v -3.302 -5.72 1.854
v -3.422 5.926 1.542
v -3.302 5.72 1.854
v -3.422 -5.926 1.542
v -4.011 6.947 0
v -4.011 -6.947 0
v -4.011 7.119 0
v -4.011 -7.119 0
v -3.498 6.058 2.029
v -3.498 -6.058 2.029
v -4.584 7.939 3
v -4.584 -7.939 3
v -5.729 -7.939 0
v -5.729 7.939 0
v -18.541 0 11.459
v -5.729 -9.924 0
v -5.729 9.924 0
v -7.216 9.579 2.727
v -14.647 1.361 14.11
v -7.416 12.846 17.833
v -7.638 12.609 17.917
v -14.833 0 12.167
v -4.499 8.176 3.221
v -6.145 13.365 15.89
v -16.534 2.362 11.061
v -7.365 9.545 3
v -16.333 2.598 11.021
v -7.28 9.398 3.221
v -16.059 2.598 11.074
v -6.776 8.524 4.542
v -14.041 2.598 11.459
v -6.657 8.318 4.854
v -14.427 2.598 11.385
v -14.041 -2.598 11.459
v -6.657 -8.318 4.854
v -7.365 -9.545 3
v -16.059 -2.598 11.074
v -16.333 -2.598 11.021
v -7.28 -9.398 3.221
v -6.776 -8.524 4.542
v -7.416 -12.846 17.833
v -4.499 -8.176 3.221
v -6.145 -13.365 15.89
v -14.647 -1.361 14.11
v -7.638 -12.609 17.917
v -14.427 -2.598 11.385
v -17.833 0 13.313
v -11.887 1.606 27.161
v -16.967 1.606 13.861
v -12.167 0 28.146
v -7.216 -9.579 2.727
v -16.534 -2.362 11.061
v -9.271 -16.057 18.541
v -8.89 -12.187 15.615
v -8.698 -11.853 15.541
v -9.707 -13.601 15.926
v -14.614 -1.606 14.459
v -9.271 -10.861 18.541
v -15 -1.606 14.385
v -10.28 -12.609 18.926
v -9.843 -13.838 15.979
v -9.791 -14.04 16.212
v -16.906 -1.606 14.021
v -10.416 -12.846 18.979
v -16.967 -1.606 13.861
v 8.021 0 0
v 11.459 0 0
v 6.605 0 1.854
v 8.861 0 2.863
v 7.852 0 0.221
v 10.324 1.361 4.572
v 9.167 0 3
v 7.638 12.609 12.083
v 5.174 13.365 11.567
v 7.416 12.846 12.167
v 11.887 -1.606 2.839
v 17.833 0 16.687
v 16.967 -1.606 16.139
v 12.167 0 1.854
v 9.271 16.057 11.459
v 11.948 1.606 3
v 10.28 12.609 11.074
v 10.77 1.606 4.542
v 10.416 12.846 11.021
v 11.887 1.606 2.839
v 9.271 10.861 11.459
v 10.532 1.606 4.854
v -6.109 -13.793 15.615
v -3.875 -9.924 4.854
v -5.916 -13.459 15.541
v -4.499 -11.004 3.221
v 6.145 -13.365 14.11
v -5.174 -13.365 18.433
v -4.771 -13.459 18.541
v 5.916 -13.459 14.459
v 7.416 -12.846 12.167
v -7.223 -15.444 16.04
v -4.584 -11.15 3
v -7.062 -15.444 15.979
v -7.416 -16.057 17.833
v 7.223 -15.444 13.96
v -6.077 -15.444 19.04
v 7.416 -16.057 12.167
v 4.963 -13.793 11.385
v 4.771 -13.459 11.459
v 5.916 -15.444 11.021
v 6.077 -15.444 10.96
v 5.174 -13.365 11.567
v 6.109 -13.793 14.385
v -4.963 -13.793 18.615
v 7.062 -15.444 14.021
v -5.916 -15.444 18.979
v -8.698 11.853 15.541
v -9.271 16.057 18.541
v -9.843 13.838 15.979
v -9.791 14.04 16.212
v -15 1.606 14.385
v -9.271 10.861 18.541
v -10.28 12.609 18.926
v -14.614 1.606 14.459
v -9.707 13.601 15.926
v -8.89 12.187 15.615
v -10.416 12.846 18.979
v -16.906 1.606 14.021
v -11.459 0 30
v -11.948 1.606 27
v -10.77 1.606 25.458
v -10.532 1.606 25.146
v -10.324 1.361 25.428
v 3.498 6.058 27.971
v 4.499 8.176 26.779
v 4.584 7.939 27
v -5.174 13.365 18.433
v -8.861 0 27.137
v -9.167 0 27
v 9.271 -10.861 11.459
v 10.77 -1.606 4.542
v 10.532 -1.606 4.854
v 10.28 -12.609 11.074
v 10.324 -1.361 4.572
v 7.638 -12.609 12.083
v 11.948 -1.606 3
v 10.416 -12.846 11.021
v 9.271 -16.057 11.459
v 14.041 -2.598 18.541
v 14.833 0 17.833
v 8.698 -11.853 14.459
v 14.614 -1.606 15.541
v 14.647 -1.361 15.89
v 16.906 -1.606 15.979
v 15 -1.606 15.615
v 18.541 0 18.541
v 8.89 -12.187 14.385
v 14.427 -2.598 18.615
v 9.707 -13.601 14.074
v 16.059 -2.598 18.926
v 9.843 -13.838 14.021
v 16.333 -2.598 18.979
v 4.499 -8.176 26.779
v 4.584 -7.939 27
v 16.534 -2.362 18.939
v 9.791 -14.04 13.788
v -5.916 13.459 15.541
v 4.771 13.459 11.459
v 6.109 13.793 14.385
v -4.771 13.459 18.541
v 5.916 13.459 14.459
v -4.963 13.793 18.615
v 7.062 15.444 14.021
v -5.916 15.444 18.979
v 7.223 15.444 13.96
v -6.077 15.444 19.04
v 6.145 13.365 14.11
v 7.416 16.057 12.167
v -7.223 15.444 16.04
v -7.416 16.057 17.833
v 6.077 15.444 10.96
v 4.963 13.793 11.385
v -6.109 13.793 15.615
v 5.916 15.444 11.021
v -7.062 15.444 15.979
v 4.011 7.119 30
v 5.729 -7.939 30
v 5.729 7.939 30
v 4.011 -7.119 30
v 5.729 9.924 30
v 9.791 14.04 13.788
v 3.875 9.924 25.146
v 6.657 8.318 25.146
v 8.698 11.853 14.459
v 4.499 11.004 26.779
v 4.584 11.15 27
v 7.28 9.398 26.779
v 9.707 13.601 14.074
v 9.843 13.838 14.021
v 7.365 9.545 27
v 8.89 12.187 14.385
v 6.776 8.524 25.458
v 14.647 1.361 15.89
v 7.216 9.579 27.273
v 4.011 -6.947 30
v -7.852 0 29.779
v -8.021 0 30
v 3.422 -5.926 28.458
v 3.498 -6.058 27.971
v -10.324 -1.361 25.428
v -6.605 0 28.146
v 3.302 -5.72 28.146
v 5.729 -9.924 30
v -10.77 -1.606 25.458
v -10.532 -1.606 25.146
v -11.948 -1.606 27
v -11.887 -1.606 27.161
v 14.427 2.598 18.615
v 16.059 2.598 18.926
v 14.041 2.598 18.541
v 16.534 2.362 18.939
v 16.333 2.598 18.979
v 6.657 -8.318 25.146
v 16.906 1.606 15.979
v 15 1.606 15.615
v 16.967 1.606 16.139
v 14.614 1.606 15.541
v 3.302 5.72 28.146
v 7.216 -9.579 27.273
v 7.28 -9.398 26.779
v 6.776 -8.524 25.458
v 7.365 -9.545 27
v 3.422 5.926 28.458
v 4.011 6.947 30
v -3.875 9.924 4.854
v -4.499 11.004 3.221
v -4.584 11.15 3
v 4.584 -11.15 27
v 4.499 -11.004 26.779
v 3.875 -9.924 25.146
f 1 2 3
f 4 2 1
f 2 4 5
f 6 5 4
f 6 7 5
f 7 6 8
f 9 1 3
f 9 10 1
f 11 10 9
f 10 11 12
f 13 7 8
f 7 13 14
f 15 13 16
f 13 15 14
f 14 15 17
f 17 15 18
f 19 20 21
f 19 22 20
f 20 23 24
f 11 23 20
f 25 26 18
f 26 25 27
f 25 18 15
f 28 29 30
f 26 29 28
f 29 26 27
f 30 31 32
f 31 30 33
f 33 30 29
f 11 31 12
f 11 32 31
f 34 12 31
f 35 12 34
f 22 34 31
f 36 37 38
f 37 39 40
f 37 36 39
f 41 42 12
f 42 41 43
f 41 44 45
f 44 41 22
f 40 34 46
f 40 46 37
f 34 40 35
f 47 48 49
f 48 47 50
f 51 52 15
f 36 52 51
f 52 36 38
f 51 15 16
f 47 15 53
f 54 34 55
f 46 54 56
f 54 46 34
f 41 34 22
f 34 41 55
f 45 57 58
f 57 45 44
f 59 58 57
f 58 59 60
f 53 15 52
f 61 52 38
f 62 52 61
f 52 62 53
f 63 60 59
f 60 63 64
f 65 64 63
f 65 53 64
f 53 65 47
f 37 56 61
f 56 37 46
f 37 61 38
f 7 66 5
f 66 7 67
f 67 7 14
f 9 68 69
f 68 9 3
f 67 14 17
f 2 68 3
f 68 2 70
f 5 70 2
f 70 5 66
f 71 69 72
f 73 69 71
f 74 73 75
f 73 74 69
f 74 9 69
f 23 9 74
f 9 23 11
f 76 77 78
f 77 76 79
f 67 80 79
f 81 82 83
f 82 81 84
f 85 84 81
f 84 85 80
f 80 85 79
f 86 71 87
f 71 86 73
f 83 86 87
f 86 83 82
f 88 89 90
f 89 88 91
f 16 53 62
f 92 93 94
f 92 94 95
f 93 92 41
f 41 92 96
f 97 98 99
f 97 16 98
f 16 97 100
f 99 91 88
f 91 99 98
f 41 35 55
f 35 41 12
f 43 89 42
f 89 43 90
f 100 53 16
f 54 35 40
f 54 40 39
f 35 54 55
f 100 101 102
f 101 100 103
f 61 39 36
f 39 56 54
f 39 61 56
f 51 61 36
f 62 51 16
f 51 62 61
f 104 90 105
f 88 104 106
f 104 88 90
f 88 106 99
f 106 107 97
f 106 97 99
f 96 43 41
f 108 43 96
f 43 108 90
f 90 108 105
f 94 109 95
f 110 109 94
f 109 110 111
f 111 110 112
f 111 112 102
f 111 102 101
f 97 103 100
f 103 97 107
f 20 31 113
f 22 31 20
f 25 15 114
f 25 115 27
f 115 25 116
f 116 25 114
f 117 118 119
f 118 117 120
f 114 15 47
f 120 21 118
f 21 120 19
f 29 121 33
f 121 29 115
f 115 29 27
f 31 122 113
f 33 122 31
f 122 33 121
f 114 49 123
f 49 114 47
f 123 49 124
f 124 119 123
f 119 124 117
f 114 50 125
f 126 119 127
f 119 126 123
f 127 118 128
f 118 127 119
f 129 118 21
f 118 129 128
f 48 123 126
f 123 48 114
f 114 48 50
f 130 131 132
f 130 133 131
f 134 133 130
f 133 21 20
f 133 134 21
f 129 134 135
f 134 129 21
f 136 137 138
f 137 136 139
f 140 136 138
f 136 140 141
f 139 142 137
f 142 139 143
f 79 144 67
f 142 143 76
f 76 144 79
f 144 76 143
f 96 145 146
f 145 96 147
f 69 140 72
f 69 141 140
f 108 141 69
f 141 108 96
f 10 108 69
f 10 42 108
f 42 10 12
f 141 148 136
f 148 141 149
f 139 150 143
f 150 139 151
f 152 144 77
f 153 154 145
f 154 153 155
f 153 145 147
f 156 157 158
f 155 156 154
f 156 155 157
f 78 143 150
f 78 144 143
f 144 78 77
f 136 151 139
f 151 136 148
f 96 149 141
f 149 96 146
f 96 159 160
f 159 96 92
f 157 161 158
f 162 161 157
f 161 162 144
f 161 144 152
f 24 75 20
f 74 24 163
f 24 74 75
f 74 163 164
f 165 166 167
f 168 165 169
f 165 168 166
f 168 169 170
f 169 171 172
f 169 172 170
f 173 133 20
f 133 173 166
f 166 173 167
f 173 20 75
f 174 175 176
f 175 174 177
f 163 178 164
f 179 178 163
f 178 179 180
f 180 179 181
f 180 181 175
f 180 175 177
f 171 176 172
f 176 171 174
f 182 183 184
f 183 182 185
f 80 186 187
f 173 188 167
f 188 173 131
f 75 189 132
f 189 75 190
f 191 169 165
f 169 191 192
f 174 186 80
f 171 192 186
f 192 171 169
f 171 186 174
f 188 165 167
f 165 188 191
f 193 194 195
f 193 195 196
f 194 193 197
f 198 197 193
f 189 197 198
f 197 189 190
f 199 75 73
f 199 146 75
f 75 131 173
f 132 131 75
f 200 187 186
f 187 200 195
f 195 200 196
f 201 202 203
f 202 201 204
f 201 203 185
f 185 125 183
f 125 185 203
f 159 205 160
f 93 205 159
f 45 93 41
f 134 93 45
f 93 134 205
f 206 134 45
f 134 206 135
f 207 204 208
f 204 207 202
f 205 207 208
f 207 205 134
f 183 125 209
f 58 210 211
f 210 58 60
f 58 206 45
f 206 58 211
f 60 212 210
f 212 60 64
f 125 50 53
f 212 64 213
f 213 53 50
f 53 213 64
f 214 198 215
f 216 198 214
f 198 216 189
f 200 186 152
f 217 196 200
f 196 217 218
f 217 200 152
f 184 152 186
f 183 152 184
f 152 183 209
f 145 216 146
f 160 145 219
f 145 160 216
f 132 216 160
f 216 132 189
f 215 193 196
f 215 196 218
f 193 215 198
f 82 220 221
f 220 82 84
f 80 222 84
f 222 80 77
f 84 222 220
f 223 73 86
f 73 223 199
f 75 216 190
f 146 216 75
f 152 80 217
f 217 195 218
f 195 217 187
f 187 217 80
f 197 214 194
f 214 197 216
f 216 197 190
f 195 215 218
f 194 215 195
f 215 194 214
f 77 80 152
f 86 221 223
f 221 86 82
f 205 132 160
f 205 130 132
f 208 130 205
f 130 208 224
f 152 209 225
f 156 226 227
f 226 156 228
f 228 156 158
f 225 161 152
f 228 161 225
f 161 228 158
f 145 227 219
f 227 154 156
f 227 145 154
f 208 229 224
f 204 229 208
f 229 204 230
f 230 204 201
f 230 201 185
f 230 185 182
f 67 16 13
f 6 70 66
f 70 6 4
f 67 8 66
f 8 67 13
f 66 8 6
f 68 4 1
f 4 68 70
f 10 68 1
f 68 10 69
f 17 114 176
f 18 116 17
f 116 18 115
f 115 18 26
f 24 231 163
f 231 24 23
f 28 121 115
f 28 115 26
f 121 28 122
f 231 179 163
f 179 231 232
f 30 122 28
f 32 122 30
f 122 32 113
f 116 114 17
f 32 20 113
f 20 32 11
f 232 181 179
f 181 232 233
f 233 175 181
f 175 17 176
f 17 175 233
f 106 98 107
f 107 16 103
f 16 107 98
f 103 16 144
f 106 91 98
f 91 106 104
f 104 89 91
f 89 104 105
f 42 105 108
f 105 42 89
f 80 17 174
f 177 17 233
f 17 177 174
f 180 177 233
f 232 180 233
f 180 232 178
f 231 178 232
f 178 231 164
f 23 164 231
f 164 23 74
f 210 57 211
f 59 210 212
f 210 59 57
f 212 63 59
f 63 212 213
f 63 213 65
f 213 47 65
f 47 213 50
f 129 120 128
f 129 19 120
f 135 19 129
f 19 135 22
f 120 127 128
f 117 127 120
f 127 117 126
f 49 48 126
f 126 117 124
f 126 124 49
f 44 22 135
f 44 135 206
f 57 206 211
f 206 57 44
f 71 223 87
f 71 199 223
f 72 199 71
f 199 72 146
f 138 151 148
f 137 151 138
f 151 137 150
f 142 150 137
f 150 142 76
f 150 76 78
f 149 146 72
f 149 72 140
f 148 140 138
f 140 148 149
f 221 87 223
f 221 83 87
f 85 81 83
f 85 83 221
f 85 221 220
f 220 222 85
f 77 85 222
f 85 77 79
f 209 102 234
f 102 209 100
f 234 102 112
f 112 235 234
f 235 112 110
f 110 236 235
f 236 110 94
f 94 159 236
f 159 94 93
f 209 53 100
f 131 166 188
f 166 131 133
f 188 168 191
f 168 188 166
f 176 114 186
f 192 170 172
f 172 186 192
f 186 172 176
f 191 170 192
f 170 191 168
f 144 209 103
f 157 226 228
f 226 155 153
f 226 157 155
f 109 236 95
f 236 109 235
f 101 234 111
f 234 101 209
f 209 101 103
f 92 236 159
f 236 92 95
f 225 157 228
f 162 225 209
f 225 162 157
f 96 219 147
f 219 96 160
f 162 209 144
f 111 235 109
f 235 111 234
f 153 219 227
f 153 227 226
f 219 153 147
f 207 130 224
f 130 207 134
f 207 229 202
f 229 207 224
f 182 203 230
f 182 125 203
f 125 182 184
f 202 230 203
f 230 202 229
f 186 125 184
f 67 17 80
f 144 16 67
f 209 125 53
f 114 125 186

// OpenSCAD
// shape height
sh = 30;
// border width
bw = 3;


translate([0, 0, sh / 2]) 
    iface_rotate() 
        icosahedron1();



// ------------ icosahedron ------------

phi = (sqrt(5) + 1) / 2;

// icosahedron vertices
ivert = [
    [0, -1, -phi], // 0
    [0, 1, -phi], // 1
    [-phi, 0, -1], // 2
    [phi, 0, -1], // 3
    [-1, -phi, 0], // 4
    [-1, phi, 0], // 5
    [1, -phi, 0], // 6
    [1, phi, 0], // 7
    [-phi, 0, 1], // 8
    [phi, 0, 1], // 9
    [0, -1, phi], // 10
    [0, 1, phi] // 11    
];

iface = [
    [0, 1, 2],
    [1, 0, 3],
    [0, 2, 4],
    [2, 1, 5],
    [1, 3, 7],
    [3, 0, 6],
    [1, 7, 5],
    [0, 4, 6],
    [2, 8, 4],
    [2, 5, 8],
    [3, 6, 9],
    [3, 9, 7],
    [4, 10, 6],
    [5, 7, 11],
    [8, 10, 4],
    [5, 11, 8],
    [9, 11, 7],
    [6, 10, 9],
    [8, 11, 10],
    [9, 10, 11]
];

if0c = (ivert[0] + ivert[1] + ivert[2]) / 3;
ifr = norm(if0c);
ifa = atan(if0c.x / if0c.z);


    

module iface_rotate() { 
    rotate([0, ifa, 0]) children();
}

module icosahedron0() {
    scale(bw / 2 / ifr) polyhedron(ivert, iface);    
}

module icosahedron1() {
    s = (sh - bw) / 2 / ifr;
    for (f = iface) {
        for (i = [0:2]) {
            j = (i + 1) % 3;
            p = f[i];
            q = f[j];
            if (p < q) {
                hull() {
                    translate(ivert[p] * s) icosahedron0();
                    translate(ivert[q] * s) icosahedron0();
                }                
            }
        }
    }    
    module hface(i) {
        f = iface[i];
        hull() {
            translate(ivert[f[0]] * s) icosahedron0();
            translate(ivert[f[1]] * s) icosahedron0();
            translate(ivert[f[2]] * s) icosahedron0();
        }
    }
    hface(0);
    hface(4);
    hface(5);
    hface(14);
    hface(15);
    hface(19);
}
